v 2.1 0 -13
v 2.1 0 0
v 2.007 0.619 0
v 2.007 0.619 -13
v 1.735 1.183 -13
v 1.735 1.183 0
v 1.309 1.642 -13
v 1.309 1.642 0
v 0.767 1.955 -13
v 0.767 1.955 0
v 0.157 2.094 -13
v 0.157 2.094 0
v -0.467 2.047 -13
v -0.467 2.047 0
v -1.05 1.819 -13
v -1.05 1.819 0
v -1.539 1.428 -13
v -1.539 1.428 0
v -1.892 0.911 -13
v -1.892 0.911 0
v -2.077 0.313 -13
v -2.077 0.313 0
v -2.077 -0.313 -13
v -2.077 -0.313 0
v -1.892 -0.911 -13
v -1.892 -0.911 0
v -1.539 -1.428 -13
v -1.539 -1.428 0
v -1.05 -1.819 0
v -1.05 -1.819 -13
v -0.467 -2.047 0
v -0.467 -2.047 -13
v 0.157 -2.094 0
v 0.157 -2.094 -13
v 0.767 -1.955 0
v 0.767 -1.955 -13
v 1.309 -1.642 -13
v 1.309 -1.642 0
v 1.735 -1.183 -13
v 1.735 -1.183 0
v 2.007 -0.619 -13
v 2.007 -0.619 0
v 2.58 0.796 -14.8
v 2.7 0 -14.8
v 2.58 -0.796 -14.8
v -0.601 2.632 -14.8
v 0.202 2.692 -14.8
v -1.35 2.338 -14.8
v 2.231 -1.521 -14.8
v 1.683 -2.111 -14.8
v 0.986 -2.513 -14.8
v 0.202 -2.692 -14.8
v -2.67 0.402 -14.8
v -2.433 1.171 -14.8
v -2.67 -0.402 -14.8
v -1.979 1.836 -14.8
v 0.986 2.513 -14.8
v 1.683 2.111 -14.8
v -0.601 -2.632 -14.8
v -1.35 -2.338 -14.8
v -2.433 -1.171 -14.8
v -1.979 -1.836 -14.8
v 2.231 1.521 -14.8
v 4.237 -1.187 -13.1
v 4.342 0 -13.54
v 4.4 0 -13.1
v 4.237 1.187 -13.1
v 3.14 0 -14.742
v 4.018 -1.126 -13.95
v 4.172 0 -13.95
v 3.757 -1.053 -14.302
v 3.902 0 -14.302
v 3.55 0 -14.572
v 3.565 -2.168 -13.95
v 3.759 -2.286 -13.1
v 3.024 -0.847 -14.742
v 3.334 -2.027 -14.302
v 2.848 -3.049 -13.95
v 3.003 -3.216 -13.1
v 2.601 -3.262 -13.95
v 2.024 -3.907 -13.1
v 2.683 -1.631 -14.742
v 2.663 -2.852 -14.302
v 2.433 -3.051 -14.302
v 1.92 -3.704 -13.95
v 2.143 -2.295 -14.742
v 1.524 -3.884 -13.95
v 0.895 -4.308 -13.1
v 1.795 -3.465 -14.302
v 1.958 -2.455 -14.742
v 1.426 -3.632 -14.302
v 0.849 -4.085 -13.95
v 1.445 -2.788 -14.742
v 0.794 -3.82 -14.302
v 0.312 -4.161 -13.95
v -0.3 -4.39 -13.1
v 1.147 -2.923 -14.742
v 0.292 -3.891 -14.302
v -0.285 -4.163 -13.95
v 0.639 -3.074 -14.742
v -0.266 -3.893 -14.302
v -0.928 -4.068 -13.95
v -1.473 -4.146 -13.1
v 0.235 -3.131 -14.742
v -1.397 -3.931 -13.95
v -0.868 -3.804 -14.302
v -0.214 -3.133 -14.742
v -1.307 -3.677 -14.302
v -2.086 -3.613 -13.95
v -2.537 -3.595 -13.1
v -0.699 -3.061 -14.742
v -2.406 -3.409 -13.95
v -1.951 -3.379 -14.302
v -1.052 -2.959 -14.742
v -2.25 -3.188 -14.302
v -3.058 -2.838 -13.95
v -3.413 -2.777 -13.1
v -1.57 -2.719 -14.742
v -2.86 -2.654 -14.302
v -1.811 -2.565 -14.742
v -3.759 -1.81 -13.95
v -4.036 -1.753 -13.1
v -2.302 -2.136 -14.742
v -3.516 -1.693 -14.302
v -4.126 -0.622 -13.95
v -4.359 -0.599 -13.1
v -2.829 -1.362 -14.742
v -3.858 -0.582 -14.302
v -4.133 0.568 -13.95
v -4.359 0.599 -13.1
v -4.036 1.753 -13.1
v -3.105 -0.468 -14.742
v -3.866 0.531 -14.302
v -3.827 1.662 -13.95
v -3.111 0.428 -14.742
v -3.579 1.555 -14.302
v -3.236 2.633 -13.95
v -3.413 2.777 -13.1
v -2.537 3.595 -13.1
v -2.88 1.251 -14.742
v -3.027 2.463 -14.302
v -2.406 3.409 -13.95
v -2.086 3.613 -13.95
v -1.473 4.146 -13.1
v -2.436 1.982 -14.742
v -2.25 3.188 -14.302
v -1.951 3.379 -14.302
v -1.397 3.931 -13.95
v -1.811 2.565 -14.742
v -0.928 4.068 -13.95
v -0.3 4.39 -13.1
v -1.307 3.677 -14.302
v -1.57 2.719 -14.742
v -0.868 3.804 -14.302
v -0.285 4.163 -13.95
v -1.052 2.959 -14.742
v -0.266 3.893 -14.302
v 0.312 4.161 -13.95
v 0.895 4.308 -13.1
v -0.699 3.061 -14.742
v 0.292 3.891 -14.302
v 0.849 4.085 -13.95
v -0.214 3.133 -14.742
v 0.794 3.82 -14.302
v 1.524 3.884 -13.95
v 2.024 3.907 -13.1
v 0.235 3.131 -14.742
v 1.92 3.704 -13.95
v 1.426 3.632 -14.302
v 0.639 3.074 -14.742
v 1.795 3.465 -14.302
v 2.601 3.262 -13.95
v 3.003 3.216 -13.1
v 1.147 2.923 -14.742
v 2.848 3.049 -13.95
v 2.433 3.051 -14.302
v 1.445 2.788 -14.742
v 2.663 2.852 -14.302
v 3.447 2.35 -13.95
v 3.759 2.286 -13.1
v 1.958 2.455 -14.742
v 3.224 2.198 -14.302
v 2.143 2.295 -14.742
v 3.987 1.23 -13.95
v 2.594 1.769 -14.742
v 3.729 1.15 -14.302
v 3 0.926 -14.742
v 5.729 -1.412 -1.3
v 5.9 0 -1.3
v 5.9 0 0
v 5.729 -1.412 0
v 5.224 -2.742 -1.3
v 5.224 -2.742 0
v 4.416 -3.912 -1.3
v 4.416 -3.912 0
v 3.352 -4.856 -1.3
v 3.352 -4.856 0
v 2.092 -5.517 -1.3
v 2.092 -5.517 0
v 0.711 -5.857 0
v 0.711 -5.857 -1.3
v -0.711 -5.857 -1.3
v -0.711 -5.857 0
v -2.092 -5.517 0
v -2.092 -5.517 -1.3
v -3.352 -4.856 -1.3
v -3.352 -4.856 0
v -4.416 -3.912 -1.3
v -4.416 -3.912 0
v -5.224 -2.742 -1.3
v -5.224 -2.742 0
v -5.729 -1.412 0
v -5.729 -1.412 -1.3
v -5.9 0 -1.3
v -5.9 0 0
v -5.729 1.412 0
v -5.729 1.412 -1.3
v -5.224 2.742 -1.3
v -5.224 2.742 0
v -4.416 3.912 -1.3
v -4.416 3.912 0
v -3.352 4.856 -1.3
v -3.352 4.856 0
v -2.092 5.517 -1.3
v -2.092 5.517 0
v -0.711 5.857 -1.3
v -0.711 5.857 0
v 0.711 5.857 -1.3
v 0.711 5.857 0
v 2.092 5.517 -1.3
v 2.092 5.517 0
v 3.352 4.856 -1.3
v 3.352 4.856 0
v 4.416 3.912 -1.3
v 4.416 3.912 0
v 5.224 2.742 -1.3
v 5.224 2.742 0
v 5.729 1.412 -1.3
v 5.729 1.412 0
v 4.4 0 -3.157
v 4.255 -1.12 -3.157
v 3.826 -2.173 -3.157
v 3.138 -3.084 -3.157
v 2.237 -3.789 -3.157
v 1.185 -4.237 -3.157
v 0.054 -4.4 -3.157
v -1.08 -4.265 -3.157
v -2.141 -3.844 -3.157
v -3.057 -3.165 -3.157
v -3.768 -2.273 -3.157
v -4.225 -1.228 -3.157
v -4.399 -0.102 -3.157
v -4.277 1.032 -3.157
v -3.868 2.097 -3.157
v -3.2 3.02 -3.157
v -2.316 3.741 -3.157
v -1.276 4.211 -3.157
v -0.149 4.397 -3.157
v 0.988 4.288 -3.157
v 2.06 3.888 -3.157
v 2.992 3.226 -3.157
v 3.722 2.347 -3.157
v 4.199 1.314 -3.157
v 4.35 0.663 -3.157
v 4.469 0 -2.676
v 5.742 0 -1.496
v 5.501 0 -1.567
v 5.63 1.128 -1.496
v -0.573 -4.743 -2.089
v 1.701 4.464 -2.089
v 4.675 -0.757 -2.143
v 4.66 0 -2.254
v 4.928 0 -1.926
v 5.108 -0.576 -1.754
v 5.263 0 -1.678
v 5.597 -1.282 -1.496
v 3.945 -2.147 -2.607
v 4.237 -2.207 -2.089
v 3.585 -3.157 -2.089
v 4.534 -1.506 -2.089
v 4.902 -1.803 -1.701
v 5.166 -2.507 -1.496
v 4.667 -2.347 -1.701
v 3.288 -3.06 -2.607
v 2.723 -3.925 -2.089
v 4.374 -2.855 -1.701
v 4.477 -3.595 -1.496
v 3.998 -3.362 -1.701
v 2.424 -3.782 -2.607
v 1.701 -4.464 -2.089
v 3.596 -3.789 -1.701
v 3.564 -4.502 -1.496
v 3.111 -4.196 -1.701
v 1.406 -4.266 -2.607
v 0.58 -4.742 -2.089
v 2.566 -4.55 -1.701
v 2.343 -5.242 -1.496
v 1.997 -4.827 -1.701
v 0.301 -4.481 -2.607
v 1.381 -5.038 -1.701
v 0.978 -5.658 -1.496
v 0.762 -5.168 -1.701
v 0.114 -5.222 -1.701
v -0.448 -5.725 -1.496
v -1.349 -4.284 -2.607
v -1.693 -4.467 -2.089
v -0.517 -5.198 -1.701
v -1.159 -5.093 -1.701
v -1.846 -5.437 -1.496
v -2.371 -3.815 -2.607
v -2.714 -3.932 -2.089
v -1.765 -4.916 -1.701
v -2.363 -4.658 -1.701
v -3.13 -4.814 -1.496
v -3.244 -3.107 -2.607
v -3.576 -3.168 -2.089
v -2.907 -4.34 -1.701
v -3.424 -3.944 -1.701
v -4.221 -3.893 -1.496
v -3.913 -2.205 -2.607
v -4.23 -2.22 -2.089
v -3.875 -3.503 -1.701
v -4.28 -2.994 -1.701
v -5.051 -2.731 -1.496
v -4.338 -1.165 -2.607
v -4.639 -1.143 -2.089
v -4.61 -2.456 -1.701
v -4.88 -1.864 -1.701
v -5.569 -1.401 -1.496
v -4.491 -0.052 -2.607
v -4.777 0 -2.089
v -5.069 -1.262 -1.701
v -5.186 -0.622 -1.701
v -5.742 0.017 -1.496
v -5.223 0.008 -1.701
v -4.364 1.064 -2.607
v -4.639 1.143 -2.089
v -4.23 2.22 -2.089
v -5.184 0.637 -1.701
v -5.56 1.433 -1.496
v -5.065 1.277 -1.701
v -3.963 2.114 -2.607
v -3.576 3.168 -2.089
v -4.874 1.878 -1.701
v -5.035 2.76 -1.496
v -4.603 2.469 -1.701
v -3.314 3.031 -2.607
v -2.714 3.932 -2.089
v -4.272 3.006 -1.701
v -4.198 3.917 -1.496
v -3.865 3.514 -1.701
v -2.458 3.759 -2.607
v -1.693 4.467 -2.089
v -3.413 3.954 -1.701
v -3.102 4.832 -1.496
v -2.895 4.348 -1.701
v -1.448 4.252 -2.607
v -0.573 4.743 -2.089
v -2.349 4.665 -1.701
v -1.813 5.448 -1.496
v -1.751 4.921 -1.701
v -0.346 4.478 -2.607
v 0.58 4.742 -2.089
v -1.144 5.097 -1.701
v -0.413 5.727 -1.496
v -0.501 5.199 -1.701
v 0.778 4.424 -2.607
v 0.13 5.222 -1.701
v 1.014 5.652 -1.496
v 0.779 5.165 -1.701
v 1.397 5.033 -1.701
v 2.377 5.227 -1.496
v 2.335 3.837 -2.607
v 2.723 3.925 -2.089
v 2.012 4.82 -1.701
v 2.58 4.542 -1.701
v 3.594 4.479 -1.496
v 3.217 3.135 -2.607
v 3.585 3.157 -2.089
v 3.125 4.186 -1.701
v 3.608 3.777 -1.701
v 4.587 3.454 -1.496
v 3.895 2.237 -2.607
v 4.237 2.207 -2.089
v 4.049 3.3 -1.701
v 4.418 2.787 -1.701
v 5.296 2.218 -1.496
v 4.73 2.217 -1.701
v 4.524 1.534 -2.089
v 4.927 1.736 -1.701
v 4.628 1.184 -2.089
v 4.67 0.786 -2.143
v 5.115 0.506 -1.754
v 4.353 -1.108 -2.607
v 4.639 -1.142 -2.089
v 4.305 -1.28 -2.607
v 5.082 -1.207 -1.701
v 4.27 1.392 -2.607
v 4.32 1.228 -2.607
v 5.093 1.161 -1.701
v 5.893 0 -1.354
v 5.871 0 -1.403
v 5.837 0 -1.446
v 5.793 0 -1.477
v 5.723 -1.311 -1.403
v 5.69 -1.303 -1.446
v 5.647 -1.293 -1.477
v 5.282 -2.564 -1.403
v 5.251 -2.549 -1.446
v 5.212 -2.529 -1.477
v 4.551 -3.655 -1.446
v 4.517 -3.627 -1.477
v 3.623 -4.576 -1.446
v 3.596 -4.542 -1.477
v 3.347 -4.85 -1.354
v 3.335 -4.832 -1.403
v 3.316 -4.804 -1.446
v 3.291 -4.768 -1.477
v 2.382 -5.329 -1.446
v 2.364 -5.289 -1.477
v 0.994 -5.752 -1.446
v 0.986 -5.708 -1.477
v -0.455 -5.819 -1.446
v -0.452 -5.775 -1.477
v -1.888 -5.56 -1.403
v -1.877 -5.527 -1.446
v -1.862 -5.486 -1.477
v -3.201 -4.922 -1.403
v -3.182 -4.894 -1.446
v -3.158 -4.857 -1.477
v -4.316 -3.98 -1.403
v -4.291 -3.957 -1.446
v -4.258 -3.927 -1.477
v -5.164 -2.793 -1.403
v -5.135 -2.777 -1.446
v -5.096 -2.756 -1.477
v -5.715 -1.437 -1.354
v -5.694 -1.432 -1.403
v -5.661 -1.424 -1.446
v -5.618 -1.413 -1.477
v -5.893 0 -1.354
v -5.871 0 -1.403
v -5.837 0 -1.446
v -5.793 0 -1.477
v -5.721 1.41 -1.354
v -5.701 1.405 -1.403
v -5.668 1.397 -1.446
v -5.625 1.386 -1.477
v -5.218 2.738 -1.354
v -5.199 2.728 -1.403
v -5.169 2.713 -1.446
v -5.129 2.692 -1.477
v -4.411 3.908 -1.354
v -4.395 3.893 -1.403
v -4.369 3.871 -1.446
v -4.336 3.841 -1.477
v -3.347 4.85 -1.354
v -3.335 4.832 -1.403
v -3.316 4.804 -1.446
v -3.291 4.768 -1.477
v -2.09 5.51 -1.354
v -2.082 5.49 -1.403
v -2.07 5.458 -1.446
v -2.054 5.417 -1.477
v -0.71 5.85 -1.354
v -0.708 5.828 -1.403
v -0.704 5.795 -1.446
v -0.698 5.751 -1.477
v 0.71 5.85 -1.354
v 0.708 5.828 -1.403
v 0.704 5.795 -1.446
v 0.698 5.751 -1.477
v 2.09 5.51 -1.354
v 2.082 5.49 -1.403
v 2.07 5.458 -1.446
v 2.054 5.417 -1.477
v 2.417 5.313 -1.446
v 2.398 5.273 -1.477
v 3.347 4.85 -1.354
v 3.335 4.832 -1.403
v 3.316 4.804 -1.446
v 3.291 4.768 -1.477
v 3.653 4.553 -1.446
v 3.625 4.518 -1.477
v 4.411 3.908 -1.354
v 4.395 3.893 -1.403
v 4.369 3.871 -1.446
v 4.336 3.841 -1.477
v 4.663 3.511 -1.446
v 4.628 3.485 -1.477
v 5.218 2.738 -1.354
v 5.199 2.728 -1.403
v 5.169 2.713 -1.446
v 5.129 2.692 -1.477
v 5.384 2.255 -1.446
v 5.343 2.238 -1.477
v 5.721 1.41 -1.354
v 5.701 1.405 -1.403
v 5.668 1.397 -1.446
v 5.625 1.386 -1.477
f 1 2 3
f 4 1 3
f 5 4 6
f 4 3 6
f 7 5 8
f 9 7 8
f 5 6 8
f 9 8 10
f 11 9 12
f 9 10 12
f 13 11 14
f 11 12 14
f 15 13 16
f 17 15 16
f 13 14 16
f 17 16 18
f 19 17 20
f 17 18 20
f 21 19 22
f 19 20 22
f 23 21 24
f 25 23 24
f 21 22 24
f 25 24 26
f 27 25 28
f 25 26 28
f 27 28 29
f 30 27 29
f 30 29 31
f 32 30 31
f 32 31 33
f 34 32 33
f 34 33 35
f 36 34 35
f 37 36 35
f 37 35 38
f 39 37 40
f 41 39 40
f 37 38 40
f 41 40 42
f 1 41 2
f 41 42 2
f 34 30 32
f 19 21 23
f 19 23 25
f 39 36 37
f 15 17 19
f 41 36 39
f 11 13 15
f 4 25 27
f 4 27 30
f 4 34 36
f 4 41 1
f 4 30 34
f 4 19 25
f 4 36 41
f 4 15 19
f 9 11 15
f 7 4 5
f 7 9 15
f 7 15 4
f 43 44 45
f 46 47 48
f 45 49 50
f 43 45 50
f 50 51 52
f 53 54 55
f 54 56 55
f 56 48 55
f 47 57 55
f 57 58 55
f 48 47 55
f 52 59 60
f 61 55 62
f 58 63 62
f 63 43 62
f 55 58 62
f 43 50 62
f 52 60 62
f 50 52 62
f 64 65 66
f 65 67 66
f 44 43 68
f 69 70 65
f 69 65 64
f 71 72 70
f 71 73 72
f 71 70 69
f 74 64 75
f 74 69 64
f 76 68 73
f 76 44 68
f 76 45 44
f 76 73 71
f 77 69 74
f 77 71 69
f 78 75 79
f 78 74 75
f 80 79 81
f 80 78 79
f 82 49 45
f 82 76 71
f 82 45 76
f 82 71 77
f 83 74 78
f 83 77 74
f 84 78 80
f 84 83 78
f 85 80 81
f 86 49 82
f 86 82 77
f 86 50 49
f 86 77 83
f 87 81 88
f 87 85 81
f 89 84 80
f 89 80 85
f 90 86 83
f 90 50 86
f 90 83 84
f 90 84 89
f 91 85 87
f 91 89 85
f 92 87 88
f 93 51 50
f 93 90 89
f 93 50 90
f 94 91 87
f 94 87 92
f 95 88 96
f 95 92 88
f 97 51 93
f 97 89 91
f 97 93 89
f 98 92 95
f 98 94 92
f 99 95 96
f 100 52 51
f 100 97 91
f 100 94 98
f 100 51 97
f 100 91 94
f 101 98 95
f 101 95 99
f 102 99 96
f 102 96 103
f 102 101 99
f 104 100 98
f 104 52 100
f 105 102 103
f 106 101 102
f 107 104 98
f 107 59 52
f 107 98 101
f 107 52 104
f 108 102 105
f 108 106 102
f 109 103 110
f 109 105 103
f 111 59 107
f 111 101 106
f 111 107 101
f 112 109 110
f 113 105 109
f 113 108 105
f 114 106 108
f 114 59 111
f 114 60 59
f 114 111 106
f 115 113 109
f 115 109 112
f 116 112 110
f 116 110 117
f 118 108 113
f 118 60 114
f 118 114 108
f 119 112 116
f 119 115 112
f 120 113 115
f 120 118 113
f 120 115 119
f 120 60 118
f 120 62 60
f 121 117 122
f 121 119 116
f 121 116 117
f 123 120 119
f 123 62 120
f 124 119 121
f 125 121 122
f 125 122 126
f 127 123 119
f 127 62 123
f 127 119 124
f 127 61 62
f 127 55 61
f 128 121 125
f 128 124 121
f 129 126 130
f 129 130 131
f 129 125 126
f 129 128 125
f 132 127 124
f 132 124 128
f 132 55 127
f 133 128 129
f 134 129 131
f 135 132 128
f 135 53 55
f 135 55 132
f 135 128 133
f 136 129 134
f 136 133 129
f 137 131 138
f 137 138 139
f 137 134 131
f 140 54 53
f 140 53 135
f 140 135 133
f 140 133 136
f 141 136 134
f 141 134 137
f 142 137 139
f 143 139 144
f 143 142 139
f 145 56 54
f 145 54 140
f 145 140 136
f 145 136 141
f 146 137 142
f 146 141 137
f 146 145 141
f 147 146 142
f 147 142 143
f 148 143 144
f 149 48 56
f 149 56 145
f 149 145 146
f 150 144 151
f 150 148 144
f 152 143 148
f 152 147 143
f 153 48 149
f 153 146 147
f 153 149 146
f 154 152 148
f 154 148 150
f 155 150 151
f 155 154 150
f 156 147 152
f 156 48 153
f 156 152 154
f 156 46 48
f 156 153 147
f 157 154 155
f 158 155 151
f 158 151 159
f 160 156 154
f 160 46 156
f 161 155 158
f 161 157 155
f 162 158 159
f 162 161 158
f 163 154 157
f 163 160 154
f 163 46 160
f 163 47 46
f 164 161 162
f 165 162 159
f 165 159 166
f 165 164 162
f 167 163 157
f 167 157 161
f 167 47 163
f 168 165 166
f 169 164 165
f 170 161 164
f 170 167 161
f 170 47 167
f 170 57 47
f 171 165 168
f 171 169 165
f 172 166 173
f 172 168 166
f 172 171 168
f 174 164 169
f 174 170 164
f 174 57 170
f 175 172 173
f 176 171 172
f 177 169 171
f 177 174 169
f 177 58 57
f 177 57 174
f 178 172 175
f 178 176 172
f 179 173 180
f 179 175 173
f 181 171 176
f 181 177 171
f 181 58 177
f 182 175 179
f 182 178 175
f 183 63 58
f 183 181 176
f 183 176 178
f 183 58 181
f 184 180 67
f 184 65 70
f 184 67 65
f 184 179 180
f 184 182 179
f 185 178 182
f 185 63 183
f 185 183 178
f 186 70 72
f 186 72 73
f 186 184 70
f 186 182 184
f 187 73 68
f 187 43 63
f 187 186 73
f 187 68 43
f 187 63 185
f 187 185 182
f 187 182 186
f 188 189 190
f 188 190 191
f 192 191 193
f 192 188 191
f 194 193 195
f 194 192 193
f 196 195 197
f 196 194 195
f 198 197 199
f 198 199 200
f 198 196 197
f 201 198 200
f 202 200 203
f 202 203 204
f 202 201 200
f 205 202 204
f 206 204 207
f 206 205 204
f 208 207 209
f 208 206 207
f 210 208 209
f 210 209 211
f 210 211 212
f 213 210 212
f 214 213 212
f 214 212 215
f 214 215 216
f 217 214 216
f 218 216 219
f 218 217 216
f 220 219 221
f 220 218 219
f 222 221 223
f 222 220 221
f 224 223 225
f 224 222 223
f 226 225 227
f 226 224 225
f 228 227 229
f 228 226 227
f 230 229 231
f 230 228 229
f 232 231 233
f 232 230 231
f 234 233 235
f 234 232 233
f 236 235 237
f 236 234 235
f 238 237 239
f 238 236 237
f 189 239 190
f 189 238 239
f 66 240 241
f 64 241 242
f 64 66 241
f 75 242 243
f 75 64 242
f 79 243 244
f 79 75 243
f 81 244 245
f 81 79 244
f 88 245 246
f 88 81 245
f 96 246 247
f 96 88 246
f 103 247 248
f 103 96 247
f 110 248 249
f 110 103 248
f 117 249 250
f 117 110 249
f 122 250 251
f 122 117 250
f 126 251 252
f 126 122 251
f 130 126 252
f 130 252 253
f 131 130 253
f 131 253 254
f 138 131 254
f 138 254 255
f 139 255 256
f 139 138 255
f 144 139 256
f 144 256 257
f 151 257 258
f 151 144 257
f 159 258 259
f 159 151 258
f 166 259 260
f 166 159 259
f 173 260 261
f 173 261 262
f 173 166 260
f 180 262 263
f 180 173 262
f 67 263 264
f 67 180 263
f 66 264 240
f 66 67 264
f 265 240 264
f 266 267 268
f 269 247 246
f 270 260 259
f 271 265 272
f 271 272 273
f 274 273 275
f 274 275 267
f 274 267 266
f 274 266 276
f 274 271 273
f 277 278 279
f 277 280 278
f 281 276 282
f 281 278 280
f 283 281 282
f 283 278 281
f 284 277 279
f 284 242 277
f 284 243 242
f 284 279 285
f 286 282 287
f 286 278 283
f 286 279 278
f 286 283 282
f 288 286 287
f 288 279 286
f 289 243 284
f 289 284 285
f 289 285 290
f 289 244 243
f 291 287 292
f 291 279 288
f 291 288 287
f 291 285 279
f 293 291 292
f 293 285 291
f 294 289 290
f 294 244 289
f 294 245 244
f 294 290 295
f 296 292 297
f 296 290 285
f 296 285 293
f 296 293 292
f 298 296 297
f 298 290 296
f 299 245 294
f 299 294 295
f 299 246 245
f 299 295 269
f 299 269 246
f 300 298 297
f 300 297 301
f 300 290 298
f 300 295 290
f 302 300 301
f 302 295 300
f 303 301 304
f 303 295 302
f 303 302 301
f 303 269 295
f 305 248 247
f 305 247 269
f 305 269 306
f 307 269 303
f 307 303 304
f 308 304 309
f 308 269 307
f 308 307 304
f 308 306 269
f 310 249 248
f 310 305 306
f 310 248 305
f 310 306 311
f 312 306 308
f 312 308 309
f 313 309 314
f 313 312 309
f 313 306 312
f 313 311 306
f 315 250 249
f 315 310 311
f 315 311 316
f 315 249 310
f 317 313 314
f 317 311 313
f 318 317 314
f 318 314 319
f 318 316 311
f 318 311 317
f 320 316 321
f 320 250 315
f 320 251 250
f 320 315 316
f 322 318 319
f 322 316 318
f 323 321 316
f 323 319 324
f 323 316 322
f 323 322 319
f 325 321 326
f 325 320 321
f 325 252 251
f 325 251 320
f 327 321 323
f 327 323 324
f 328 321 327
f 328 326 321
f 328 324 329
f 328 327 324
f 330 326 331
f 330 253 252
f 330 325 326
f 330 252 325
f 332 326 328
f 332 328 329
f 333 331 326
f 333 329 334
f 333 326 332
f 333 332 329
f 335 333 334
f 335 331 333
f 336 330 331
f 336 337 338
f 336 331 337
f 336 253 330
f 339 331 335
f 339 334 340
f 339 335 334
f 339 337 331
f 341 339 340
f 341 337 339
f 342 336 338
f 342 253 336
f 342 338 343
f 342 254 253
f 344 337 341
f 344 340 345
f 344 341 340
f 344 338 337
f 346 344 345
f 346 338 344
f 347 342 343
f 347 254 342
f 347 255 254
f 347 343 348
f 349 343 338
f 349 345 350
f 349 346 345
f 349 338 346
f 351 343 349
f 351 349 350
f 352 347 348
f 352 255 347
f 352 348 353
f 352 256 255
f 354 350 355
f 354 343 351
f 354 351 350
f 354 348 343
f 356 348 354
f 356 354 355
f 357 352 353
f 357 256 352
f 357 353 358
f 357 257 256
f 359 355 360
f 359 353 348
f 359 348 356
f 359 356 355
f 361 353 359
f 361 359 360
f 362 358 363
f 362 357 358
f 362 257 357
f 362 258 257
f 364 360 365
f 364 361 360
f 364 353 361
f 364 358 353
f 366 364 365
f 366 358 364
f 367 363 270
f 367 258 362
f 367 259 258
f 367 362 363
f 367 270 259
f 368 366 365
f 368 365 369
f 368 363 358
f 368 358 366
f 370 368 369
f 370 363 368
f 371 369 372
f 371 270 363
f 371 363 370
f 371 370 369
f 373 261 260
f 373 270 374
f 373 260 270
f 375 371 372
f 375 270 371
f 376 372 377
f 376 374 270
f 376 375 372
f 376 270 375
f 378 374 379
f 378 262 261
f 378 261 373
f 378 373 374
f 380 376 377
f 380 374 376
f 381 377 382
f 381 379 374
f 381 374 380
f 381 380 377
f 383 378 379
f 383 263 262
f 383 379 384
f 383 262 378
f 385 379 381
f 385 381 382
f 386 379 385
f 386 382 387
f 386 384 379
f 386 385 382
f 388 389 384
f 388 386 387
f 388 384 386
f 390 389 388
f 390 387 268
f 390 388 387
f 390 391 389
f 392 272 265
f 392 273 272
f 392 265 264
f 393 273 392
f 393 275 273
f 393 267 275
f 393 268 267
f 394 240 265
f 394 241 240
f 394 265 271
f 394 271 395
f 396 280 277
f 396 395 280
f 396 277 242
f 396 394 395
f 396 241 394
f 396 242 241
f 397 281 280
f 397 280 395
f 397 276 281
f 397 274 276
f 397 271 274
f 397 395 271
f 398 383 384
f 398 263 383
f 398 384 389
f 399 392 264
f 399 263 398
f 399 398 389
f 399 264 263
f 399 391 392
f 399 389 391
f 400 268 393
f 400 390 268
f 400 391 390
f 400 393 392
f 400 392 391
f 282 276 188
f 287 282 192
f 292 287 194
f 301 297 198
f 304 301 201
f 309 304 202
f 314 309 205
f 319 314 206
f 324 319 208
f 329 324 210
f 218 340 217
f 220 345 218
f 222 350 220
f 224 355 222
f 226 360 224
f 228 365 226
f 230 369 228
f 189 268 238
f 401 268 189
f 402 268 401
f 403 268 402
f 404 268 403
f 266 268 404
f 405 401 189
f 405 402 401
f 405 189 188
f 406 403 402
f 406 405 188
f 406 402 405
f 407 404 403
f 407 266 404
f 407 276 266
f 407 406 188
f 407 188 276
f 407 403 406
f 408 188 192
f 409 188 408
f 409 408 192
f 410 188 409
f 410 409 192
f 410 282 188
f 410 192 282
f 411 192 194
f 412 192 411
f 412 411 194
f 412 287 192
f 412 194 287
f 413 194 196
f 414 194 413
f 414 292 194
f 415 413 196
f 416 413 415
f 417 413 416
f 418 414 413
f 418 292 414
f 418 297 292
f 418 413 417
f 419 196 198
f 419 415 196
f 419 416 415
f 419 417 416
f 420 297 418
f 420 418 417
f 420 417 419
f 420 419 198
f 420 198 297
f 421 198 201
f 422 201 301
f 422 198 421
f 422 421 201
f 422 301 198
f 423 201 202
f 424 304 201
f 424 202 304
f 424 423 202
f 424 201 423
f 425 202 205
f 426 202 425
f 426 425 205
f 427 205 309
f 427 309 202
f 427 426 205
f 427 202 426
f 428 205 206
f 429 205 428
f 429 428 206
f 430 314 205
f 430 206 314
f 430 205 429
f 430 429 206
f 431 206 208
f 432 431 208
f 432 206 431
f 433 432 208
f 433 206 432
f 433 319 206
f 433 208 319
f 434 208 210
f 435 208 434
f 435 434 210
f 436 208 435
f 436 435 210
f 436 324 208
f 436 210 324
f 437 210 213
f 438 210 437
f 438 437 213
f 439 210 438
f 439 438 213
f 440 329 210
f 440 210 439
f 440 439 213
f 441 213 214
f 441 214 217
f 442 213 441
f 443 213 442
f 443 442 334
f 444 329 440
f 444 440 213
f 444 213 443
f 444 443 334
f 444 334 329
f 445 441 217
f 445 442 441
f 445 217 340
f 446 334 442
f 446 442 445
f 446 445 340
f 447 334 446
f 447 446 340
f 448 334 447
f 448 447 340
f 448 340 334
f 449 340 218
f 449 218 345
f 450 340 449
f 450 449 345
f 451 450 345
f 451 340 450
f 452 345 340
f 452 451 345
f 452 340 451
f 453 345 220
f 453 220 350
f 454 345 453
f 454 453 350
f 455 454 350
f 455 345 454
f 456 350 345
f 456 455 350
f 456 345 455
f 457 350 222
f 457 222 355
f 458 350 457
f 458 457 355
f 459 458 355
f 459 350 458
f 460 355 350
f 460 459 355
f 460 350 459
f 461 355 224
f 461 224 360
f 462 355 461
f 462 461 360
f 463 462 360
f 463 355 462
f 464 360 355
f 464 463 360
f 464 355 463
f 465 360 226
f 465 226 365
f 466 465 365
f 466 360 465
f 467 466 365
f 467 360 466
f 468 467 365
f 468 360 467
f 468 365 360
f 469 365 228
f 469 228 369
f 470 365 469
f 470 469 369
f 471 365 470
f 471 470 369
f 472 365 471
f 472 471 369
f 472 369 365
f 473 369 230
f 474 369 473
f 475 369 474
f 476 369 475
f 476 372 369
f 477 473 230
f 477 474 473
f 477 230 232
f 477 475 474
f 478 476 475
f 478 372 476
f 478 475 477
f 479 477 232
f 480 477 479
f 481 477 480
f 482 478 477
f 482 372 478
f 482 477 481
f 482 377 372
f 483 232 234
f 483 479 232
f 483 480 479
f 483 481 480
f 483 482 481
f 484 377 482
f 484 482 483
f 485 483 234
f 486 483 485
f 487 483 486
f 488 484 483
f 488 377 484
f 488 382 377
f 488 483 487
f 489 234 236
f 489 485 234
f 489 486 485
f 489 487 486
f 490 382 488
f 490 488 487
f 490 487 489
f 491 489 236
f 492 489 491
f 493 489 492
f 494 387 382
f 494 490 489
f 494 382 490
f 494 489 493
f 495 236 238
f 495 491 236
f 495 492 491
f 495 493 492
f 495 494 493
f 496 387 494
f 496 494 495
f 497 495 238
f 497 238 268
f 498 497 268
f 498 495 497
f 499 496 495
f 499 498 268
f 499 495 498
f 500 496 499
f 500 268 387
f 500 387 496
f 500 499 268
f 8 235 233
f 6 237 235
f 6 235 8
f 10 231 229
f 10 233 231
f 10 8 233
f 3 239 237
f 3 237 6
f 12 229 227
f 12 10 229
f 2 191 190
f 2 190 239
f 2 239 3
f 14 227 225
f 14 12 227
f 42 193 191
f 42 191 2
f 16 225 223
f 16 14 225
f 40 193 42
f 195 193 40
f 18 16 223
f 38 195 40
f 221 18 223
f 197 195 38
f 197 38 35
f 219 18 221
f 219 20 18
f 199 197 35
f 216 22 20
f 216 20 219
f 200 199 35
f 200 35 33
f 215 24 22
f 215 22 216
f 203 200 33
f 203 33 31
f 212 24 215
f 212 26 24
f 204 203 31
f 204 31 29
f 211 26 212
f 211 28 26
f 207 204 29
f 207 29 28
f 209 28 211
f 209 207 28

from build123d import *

# Parameters (mm, degrees)
CROQUIS1_W            = 5.9
CROQUIS1_H            = 14.8
CROQUIS2_R            = 2.1
CORTAR_EXTRUIR2_DEPTH = 13
CROQUIS23_W           = 1.5
CROQUIS23_H           = 13.3
REDONDEO1_R           = 0.2
REDONDEO2_R           = 1.7
REDONDEO3_R           = 1.7


with BuildPart() as part:
    # Croquis1 → Revolución1 (revolve)
    with BuildSketch(Plane(origin=(0, 0, 0), x_dir=(1, 0, 0), z_dir=(0, 1, 0))):
        with Locations((2.95, 7.4)):
            Rectangle(CROQUIS1_W, CROQUIS1_H)
    revolve(axis=Axis((0, 0, 0), (0, 0, -1)))

    # Croquis2 → Cortar-Extruir2 (cut)
    with BuildSketch(Plane.XY):
        Circle(CROQUIS2_R)
    extrude(amount=-CORTAR_EXTRUIR2_DEPTH, mode=Mode.SUBTRACT)

    # Croquis23 → Cortar-Revolución2 (revolve, cut)
    with BuildSketch(Plane(origin=(0, 0, 0), x_dir=(1, 0, 0), z_dir=(0, 1, 0))):
        with Locations((5.15, 8.15)):
            Rectangle(CROQUIS23_W, CROQUIS23_H)
    revolve(axis=Axis((0, 0, -1.5), (0, 0, -1)), mode=Mode.SUBTRACT)

    # Redondeo1
    redondeo1_edges = [part.edges().sort_by_distance(p)[0] for p in [
        (-5.9, 0, -1.5),
    ]]
    fillet(redondeo1_edges, radius=REDONDEO1_R)

    # Redondeo2
    redondeo2_edges = [part.edges().sort_by_distance(p)[0] for p in [
        (-4.4, 0, -14.8),
    ]]
    fillet(redondeo2_edges, radius=REDONDEO2_R)

    # Redondeo3
    redondeo3_edges = [part.edges().sort_by_distance(p)[0] for p in [
        (-4.4, 0, -1.5),
    ]]
    fillet(redondeo3_edges, radius=REDONDEO3_R)


solid = part.part
